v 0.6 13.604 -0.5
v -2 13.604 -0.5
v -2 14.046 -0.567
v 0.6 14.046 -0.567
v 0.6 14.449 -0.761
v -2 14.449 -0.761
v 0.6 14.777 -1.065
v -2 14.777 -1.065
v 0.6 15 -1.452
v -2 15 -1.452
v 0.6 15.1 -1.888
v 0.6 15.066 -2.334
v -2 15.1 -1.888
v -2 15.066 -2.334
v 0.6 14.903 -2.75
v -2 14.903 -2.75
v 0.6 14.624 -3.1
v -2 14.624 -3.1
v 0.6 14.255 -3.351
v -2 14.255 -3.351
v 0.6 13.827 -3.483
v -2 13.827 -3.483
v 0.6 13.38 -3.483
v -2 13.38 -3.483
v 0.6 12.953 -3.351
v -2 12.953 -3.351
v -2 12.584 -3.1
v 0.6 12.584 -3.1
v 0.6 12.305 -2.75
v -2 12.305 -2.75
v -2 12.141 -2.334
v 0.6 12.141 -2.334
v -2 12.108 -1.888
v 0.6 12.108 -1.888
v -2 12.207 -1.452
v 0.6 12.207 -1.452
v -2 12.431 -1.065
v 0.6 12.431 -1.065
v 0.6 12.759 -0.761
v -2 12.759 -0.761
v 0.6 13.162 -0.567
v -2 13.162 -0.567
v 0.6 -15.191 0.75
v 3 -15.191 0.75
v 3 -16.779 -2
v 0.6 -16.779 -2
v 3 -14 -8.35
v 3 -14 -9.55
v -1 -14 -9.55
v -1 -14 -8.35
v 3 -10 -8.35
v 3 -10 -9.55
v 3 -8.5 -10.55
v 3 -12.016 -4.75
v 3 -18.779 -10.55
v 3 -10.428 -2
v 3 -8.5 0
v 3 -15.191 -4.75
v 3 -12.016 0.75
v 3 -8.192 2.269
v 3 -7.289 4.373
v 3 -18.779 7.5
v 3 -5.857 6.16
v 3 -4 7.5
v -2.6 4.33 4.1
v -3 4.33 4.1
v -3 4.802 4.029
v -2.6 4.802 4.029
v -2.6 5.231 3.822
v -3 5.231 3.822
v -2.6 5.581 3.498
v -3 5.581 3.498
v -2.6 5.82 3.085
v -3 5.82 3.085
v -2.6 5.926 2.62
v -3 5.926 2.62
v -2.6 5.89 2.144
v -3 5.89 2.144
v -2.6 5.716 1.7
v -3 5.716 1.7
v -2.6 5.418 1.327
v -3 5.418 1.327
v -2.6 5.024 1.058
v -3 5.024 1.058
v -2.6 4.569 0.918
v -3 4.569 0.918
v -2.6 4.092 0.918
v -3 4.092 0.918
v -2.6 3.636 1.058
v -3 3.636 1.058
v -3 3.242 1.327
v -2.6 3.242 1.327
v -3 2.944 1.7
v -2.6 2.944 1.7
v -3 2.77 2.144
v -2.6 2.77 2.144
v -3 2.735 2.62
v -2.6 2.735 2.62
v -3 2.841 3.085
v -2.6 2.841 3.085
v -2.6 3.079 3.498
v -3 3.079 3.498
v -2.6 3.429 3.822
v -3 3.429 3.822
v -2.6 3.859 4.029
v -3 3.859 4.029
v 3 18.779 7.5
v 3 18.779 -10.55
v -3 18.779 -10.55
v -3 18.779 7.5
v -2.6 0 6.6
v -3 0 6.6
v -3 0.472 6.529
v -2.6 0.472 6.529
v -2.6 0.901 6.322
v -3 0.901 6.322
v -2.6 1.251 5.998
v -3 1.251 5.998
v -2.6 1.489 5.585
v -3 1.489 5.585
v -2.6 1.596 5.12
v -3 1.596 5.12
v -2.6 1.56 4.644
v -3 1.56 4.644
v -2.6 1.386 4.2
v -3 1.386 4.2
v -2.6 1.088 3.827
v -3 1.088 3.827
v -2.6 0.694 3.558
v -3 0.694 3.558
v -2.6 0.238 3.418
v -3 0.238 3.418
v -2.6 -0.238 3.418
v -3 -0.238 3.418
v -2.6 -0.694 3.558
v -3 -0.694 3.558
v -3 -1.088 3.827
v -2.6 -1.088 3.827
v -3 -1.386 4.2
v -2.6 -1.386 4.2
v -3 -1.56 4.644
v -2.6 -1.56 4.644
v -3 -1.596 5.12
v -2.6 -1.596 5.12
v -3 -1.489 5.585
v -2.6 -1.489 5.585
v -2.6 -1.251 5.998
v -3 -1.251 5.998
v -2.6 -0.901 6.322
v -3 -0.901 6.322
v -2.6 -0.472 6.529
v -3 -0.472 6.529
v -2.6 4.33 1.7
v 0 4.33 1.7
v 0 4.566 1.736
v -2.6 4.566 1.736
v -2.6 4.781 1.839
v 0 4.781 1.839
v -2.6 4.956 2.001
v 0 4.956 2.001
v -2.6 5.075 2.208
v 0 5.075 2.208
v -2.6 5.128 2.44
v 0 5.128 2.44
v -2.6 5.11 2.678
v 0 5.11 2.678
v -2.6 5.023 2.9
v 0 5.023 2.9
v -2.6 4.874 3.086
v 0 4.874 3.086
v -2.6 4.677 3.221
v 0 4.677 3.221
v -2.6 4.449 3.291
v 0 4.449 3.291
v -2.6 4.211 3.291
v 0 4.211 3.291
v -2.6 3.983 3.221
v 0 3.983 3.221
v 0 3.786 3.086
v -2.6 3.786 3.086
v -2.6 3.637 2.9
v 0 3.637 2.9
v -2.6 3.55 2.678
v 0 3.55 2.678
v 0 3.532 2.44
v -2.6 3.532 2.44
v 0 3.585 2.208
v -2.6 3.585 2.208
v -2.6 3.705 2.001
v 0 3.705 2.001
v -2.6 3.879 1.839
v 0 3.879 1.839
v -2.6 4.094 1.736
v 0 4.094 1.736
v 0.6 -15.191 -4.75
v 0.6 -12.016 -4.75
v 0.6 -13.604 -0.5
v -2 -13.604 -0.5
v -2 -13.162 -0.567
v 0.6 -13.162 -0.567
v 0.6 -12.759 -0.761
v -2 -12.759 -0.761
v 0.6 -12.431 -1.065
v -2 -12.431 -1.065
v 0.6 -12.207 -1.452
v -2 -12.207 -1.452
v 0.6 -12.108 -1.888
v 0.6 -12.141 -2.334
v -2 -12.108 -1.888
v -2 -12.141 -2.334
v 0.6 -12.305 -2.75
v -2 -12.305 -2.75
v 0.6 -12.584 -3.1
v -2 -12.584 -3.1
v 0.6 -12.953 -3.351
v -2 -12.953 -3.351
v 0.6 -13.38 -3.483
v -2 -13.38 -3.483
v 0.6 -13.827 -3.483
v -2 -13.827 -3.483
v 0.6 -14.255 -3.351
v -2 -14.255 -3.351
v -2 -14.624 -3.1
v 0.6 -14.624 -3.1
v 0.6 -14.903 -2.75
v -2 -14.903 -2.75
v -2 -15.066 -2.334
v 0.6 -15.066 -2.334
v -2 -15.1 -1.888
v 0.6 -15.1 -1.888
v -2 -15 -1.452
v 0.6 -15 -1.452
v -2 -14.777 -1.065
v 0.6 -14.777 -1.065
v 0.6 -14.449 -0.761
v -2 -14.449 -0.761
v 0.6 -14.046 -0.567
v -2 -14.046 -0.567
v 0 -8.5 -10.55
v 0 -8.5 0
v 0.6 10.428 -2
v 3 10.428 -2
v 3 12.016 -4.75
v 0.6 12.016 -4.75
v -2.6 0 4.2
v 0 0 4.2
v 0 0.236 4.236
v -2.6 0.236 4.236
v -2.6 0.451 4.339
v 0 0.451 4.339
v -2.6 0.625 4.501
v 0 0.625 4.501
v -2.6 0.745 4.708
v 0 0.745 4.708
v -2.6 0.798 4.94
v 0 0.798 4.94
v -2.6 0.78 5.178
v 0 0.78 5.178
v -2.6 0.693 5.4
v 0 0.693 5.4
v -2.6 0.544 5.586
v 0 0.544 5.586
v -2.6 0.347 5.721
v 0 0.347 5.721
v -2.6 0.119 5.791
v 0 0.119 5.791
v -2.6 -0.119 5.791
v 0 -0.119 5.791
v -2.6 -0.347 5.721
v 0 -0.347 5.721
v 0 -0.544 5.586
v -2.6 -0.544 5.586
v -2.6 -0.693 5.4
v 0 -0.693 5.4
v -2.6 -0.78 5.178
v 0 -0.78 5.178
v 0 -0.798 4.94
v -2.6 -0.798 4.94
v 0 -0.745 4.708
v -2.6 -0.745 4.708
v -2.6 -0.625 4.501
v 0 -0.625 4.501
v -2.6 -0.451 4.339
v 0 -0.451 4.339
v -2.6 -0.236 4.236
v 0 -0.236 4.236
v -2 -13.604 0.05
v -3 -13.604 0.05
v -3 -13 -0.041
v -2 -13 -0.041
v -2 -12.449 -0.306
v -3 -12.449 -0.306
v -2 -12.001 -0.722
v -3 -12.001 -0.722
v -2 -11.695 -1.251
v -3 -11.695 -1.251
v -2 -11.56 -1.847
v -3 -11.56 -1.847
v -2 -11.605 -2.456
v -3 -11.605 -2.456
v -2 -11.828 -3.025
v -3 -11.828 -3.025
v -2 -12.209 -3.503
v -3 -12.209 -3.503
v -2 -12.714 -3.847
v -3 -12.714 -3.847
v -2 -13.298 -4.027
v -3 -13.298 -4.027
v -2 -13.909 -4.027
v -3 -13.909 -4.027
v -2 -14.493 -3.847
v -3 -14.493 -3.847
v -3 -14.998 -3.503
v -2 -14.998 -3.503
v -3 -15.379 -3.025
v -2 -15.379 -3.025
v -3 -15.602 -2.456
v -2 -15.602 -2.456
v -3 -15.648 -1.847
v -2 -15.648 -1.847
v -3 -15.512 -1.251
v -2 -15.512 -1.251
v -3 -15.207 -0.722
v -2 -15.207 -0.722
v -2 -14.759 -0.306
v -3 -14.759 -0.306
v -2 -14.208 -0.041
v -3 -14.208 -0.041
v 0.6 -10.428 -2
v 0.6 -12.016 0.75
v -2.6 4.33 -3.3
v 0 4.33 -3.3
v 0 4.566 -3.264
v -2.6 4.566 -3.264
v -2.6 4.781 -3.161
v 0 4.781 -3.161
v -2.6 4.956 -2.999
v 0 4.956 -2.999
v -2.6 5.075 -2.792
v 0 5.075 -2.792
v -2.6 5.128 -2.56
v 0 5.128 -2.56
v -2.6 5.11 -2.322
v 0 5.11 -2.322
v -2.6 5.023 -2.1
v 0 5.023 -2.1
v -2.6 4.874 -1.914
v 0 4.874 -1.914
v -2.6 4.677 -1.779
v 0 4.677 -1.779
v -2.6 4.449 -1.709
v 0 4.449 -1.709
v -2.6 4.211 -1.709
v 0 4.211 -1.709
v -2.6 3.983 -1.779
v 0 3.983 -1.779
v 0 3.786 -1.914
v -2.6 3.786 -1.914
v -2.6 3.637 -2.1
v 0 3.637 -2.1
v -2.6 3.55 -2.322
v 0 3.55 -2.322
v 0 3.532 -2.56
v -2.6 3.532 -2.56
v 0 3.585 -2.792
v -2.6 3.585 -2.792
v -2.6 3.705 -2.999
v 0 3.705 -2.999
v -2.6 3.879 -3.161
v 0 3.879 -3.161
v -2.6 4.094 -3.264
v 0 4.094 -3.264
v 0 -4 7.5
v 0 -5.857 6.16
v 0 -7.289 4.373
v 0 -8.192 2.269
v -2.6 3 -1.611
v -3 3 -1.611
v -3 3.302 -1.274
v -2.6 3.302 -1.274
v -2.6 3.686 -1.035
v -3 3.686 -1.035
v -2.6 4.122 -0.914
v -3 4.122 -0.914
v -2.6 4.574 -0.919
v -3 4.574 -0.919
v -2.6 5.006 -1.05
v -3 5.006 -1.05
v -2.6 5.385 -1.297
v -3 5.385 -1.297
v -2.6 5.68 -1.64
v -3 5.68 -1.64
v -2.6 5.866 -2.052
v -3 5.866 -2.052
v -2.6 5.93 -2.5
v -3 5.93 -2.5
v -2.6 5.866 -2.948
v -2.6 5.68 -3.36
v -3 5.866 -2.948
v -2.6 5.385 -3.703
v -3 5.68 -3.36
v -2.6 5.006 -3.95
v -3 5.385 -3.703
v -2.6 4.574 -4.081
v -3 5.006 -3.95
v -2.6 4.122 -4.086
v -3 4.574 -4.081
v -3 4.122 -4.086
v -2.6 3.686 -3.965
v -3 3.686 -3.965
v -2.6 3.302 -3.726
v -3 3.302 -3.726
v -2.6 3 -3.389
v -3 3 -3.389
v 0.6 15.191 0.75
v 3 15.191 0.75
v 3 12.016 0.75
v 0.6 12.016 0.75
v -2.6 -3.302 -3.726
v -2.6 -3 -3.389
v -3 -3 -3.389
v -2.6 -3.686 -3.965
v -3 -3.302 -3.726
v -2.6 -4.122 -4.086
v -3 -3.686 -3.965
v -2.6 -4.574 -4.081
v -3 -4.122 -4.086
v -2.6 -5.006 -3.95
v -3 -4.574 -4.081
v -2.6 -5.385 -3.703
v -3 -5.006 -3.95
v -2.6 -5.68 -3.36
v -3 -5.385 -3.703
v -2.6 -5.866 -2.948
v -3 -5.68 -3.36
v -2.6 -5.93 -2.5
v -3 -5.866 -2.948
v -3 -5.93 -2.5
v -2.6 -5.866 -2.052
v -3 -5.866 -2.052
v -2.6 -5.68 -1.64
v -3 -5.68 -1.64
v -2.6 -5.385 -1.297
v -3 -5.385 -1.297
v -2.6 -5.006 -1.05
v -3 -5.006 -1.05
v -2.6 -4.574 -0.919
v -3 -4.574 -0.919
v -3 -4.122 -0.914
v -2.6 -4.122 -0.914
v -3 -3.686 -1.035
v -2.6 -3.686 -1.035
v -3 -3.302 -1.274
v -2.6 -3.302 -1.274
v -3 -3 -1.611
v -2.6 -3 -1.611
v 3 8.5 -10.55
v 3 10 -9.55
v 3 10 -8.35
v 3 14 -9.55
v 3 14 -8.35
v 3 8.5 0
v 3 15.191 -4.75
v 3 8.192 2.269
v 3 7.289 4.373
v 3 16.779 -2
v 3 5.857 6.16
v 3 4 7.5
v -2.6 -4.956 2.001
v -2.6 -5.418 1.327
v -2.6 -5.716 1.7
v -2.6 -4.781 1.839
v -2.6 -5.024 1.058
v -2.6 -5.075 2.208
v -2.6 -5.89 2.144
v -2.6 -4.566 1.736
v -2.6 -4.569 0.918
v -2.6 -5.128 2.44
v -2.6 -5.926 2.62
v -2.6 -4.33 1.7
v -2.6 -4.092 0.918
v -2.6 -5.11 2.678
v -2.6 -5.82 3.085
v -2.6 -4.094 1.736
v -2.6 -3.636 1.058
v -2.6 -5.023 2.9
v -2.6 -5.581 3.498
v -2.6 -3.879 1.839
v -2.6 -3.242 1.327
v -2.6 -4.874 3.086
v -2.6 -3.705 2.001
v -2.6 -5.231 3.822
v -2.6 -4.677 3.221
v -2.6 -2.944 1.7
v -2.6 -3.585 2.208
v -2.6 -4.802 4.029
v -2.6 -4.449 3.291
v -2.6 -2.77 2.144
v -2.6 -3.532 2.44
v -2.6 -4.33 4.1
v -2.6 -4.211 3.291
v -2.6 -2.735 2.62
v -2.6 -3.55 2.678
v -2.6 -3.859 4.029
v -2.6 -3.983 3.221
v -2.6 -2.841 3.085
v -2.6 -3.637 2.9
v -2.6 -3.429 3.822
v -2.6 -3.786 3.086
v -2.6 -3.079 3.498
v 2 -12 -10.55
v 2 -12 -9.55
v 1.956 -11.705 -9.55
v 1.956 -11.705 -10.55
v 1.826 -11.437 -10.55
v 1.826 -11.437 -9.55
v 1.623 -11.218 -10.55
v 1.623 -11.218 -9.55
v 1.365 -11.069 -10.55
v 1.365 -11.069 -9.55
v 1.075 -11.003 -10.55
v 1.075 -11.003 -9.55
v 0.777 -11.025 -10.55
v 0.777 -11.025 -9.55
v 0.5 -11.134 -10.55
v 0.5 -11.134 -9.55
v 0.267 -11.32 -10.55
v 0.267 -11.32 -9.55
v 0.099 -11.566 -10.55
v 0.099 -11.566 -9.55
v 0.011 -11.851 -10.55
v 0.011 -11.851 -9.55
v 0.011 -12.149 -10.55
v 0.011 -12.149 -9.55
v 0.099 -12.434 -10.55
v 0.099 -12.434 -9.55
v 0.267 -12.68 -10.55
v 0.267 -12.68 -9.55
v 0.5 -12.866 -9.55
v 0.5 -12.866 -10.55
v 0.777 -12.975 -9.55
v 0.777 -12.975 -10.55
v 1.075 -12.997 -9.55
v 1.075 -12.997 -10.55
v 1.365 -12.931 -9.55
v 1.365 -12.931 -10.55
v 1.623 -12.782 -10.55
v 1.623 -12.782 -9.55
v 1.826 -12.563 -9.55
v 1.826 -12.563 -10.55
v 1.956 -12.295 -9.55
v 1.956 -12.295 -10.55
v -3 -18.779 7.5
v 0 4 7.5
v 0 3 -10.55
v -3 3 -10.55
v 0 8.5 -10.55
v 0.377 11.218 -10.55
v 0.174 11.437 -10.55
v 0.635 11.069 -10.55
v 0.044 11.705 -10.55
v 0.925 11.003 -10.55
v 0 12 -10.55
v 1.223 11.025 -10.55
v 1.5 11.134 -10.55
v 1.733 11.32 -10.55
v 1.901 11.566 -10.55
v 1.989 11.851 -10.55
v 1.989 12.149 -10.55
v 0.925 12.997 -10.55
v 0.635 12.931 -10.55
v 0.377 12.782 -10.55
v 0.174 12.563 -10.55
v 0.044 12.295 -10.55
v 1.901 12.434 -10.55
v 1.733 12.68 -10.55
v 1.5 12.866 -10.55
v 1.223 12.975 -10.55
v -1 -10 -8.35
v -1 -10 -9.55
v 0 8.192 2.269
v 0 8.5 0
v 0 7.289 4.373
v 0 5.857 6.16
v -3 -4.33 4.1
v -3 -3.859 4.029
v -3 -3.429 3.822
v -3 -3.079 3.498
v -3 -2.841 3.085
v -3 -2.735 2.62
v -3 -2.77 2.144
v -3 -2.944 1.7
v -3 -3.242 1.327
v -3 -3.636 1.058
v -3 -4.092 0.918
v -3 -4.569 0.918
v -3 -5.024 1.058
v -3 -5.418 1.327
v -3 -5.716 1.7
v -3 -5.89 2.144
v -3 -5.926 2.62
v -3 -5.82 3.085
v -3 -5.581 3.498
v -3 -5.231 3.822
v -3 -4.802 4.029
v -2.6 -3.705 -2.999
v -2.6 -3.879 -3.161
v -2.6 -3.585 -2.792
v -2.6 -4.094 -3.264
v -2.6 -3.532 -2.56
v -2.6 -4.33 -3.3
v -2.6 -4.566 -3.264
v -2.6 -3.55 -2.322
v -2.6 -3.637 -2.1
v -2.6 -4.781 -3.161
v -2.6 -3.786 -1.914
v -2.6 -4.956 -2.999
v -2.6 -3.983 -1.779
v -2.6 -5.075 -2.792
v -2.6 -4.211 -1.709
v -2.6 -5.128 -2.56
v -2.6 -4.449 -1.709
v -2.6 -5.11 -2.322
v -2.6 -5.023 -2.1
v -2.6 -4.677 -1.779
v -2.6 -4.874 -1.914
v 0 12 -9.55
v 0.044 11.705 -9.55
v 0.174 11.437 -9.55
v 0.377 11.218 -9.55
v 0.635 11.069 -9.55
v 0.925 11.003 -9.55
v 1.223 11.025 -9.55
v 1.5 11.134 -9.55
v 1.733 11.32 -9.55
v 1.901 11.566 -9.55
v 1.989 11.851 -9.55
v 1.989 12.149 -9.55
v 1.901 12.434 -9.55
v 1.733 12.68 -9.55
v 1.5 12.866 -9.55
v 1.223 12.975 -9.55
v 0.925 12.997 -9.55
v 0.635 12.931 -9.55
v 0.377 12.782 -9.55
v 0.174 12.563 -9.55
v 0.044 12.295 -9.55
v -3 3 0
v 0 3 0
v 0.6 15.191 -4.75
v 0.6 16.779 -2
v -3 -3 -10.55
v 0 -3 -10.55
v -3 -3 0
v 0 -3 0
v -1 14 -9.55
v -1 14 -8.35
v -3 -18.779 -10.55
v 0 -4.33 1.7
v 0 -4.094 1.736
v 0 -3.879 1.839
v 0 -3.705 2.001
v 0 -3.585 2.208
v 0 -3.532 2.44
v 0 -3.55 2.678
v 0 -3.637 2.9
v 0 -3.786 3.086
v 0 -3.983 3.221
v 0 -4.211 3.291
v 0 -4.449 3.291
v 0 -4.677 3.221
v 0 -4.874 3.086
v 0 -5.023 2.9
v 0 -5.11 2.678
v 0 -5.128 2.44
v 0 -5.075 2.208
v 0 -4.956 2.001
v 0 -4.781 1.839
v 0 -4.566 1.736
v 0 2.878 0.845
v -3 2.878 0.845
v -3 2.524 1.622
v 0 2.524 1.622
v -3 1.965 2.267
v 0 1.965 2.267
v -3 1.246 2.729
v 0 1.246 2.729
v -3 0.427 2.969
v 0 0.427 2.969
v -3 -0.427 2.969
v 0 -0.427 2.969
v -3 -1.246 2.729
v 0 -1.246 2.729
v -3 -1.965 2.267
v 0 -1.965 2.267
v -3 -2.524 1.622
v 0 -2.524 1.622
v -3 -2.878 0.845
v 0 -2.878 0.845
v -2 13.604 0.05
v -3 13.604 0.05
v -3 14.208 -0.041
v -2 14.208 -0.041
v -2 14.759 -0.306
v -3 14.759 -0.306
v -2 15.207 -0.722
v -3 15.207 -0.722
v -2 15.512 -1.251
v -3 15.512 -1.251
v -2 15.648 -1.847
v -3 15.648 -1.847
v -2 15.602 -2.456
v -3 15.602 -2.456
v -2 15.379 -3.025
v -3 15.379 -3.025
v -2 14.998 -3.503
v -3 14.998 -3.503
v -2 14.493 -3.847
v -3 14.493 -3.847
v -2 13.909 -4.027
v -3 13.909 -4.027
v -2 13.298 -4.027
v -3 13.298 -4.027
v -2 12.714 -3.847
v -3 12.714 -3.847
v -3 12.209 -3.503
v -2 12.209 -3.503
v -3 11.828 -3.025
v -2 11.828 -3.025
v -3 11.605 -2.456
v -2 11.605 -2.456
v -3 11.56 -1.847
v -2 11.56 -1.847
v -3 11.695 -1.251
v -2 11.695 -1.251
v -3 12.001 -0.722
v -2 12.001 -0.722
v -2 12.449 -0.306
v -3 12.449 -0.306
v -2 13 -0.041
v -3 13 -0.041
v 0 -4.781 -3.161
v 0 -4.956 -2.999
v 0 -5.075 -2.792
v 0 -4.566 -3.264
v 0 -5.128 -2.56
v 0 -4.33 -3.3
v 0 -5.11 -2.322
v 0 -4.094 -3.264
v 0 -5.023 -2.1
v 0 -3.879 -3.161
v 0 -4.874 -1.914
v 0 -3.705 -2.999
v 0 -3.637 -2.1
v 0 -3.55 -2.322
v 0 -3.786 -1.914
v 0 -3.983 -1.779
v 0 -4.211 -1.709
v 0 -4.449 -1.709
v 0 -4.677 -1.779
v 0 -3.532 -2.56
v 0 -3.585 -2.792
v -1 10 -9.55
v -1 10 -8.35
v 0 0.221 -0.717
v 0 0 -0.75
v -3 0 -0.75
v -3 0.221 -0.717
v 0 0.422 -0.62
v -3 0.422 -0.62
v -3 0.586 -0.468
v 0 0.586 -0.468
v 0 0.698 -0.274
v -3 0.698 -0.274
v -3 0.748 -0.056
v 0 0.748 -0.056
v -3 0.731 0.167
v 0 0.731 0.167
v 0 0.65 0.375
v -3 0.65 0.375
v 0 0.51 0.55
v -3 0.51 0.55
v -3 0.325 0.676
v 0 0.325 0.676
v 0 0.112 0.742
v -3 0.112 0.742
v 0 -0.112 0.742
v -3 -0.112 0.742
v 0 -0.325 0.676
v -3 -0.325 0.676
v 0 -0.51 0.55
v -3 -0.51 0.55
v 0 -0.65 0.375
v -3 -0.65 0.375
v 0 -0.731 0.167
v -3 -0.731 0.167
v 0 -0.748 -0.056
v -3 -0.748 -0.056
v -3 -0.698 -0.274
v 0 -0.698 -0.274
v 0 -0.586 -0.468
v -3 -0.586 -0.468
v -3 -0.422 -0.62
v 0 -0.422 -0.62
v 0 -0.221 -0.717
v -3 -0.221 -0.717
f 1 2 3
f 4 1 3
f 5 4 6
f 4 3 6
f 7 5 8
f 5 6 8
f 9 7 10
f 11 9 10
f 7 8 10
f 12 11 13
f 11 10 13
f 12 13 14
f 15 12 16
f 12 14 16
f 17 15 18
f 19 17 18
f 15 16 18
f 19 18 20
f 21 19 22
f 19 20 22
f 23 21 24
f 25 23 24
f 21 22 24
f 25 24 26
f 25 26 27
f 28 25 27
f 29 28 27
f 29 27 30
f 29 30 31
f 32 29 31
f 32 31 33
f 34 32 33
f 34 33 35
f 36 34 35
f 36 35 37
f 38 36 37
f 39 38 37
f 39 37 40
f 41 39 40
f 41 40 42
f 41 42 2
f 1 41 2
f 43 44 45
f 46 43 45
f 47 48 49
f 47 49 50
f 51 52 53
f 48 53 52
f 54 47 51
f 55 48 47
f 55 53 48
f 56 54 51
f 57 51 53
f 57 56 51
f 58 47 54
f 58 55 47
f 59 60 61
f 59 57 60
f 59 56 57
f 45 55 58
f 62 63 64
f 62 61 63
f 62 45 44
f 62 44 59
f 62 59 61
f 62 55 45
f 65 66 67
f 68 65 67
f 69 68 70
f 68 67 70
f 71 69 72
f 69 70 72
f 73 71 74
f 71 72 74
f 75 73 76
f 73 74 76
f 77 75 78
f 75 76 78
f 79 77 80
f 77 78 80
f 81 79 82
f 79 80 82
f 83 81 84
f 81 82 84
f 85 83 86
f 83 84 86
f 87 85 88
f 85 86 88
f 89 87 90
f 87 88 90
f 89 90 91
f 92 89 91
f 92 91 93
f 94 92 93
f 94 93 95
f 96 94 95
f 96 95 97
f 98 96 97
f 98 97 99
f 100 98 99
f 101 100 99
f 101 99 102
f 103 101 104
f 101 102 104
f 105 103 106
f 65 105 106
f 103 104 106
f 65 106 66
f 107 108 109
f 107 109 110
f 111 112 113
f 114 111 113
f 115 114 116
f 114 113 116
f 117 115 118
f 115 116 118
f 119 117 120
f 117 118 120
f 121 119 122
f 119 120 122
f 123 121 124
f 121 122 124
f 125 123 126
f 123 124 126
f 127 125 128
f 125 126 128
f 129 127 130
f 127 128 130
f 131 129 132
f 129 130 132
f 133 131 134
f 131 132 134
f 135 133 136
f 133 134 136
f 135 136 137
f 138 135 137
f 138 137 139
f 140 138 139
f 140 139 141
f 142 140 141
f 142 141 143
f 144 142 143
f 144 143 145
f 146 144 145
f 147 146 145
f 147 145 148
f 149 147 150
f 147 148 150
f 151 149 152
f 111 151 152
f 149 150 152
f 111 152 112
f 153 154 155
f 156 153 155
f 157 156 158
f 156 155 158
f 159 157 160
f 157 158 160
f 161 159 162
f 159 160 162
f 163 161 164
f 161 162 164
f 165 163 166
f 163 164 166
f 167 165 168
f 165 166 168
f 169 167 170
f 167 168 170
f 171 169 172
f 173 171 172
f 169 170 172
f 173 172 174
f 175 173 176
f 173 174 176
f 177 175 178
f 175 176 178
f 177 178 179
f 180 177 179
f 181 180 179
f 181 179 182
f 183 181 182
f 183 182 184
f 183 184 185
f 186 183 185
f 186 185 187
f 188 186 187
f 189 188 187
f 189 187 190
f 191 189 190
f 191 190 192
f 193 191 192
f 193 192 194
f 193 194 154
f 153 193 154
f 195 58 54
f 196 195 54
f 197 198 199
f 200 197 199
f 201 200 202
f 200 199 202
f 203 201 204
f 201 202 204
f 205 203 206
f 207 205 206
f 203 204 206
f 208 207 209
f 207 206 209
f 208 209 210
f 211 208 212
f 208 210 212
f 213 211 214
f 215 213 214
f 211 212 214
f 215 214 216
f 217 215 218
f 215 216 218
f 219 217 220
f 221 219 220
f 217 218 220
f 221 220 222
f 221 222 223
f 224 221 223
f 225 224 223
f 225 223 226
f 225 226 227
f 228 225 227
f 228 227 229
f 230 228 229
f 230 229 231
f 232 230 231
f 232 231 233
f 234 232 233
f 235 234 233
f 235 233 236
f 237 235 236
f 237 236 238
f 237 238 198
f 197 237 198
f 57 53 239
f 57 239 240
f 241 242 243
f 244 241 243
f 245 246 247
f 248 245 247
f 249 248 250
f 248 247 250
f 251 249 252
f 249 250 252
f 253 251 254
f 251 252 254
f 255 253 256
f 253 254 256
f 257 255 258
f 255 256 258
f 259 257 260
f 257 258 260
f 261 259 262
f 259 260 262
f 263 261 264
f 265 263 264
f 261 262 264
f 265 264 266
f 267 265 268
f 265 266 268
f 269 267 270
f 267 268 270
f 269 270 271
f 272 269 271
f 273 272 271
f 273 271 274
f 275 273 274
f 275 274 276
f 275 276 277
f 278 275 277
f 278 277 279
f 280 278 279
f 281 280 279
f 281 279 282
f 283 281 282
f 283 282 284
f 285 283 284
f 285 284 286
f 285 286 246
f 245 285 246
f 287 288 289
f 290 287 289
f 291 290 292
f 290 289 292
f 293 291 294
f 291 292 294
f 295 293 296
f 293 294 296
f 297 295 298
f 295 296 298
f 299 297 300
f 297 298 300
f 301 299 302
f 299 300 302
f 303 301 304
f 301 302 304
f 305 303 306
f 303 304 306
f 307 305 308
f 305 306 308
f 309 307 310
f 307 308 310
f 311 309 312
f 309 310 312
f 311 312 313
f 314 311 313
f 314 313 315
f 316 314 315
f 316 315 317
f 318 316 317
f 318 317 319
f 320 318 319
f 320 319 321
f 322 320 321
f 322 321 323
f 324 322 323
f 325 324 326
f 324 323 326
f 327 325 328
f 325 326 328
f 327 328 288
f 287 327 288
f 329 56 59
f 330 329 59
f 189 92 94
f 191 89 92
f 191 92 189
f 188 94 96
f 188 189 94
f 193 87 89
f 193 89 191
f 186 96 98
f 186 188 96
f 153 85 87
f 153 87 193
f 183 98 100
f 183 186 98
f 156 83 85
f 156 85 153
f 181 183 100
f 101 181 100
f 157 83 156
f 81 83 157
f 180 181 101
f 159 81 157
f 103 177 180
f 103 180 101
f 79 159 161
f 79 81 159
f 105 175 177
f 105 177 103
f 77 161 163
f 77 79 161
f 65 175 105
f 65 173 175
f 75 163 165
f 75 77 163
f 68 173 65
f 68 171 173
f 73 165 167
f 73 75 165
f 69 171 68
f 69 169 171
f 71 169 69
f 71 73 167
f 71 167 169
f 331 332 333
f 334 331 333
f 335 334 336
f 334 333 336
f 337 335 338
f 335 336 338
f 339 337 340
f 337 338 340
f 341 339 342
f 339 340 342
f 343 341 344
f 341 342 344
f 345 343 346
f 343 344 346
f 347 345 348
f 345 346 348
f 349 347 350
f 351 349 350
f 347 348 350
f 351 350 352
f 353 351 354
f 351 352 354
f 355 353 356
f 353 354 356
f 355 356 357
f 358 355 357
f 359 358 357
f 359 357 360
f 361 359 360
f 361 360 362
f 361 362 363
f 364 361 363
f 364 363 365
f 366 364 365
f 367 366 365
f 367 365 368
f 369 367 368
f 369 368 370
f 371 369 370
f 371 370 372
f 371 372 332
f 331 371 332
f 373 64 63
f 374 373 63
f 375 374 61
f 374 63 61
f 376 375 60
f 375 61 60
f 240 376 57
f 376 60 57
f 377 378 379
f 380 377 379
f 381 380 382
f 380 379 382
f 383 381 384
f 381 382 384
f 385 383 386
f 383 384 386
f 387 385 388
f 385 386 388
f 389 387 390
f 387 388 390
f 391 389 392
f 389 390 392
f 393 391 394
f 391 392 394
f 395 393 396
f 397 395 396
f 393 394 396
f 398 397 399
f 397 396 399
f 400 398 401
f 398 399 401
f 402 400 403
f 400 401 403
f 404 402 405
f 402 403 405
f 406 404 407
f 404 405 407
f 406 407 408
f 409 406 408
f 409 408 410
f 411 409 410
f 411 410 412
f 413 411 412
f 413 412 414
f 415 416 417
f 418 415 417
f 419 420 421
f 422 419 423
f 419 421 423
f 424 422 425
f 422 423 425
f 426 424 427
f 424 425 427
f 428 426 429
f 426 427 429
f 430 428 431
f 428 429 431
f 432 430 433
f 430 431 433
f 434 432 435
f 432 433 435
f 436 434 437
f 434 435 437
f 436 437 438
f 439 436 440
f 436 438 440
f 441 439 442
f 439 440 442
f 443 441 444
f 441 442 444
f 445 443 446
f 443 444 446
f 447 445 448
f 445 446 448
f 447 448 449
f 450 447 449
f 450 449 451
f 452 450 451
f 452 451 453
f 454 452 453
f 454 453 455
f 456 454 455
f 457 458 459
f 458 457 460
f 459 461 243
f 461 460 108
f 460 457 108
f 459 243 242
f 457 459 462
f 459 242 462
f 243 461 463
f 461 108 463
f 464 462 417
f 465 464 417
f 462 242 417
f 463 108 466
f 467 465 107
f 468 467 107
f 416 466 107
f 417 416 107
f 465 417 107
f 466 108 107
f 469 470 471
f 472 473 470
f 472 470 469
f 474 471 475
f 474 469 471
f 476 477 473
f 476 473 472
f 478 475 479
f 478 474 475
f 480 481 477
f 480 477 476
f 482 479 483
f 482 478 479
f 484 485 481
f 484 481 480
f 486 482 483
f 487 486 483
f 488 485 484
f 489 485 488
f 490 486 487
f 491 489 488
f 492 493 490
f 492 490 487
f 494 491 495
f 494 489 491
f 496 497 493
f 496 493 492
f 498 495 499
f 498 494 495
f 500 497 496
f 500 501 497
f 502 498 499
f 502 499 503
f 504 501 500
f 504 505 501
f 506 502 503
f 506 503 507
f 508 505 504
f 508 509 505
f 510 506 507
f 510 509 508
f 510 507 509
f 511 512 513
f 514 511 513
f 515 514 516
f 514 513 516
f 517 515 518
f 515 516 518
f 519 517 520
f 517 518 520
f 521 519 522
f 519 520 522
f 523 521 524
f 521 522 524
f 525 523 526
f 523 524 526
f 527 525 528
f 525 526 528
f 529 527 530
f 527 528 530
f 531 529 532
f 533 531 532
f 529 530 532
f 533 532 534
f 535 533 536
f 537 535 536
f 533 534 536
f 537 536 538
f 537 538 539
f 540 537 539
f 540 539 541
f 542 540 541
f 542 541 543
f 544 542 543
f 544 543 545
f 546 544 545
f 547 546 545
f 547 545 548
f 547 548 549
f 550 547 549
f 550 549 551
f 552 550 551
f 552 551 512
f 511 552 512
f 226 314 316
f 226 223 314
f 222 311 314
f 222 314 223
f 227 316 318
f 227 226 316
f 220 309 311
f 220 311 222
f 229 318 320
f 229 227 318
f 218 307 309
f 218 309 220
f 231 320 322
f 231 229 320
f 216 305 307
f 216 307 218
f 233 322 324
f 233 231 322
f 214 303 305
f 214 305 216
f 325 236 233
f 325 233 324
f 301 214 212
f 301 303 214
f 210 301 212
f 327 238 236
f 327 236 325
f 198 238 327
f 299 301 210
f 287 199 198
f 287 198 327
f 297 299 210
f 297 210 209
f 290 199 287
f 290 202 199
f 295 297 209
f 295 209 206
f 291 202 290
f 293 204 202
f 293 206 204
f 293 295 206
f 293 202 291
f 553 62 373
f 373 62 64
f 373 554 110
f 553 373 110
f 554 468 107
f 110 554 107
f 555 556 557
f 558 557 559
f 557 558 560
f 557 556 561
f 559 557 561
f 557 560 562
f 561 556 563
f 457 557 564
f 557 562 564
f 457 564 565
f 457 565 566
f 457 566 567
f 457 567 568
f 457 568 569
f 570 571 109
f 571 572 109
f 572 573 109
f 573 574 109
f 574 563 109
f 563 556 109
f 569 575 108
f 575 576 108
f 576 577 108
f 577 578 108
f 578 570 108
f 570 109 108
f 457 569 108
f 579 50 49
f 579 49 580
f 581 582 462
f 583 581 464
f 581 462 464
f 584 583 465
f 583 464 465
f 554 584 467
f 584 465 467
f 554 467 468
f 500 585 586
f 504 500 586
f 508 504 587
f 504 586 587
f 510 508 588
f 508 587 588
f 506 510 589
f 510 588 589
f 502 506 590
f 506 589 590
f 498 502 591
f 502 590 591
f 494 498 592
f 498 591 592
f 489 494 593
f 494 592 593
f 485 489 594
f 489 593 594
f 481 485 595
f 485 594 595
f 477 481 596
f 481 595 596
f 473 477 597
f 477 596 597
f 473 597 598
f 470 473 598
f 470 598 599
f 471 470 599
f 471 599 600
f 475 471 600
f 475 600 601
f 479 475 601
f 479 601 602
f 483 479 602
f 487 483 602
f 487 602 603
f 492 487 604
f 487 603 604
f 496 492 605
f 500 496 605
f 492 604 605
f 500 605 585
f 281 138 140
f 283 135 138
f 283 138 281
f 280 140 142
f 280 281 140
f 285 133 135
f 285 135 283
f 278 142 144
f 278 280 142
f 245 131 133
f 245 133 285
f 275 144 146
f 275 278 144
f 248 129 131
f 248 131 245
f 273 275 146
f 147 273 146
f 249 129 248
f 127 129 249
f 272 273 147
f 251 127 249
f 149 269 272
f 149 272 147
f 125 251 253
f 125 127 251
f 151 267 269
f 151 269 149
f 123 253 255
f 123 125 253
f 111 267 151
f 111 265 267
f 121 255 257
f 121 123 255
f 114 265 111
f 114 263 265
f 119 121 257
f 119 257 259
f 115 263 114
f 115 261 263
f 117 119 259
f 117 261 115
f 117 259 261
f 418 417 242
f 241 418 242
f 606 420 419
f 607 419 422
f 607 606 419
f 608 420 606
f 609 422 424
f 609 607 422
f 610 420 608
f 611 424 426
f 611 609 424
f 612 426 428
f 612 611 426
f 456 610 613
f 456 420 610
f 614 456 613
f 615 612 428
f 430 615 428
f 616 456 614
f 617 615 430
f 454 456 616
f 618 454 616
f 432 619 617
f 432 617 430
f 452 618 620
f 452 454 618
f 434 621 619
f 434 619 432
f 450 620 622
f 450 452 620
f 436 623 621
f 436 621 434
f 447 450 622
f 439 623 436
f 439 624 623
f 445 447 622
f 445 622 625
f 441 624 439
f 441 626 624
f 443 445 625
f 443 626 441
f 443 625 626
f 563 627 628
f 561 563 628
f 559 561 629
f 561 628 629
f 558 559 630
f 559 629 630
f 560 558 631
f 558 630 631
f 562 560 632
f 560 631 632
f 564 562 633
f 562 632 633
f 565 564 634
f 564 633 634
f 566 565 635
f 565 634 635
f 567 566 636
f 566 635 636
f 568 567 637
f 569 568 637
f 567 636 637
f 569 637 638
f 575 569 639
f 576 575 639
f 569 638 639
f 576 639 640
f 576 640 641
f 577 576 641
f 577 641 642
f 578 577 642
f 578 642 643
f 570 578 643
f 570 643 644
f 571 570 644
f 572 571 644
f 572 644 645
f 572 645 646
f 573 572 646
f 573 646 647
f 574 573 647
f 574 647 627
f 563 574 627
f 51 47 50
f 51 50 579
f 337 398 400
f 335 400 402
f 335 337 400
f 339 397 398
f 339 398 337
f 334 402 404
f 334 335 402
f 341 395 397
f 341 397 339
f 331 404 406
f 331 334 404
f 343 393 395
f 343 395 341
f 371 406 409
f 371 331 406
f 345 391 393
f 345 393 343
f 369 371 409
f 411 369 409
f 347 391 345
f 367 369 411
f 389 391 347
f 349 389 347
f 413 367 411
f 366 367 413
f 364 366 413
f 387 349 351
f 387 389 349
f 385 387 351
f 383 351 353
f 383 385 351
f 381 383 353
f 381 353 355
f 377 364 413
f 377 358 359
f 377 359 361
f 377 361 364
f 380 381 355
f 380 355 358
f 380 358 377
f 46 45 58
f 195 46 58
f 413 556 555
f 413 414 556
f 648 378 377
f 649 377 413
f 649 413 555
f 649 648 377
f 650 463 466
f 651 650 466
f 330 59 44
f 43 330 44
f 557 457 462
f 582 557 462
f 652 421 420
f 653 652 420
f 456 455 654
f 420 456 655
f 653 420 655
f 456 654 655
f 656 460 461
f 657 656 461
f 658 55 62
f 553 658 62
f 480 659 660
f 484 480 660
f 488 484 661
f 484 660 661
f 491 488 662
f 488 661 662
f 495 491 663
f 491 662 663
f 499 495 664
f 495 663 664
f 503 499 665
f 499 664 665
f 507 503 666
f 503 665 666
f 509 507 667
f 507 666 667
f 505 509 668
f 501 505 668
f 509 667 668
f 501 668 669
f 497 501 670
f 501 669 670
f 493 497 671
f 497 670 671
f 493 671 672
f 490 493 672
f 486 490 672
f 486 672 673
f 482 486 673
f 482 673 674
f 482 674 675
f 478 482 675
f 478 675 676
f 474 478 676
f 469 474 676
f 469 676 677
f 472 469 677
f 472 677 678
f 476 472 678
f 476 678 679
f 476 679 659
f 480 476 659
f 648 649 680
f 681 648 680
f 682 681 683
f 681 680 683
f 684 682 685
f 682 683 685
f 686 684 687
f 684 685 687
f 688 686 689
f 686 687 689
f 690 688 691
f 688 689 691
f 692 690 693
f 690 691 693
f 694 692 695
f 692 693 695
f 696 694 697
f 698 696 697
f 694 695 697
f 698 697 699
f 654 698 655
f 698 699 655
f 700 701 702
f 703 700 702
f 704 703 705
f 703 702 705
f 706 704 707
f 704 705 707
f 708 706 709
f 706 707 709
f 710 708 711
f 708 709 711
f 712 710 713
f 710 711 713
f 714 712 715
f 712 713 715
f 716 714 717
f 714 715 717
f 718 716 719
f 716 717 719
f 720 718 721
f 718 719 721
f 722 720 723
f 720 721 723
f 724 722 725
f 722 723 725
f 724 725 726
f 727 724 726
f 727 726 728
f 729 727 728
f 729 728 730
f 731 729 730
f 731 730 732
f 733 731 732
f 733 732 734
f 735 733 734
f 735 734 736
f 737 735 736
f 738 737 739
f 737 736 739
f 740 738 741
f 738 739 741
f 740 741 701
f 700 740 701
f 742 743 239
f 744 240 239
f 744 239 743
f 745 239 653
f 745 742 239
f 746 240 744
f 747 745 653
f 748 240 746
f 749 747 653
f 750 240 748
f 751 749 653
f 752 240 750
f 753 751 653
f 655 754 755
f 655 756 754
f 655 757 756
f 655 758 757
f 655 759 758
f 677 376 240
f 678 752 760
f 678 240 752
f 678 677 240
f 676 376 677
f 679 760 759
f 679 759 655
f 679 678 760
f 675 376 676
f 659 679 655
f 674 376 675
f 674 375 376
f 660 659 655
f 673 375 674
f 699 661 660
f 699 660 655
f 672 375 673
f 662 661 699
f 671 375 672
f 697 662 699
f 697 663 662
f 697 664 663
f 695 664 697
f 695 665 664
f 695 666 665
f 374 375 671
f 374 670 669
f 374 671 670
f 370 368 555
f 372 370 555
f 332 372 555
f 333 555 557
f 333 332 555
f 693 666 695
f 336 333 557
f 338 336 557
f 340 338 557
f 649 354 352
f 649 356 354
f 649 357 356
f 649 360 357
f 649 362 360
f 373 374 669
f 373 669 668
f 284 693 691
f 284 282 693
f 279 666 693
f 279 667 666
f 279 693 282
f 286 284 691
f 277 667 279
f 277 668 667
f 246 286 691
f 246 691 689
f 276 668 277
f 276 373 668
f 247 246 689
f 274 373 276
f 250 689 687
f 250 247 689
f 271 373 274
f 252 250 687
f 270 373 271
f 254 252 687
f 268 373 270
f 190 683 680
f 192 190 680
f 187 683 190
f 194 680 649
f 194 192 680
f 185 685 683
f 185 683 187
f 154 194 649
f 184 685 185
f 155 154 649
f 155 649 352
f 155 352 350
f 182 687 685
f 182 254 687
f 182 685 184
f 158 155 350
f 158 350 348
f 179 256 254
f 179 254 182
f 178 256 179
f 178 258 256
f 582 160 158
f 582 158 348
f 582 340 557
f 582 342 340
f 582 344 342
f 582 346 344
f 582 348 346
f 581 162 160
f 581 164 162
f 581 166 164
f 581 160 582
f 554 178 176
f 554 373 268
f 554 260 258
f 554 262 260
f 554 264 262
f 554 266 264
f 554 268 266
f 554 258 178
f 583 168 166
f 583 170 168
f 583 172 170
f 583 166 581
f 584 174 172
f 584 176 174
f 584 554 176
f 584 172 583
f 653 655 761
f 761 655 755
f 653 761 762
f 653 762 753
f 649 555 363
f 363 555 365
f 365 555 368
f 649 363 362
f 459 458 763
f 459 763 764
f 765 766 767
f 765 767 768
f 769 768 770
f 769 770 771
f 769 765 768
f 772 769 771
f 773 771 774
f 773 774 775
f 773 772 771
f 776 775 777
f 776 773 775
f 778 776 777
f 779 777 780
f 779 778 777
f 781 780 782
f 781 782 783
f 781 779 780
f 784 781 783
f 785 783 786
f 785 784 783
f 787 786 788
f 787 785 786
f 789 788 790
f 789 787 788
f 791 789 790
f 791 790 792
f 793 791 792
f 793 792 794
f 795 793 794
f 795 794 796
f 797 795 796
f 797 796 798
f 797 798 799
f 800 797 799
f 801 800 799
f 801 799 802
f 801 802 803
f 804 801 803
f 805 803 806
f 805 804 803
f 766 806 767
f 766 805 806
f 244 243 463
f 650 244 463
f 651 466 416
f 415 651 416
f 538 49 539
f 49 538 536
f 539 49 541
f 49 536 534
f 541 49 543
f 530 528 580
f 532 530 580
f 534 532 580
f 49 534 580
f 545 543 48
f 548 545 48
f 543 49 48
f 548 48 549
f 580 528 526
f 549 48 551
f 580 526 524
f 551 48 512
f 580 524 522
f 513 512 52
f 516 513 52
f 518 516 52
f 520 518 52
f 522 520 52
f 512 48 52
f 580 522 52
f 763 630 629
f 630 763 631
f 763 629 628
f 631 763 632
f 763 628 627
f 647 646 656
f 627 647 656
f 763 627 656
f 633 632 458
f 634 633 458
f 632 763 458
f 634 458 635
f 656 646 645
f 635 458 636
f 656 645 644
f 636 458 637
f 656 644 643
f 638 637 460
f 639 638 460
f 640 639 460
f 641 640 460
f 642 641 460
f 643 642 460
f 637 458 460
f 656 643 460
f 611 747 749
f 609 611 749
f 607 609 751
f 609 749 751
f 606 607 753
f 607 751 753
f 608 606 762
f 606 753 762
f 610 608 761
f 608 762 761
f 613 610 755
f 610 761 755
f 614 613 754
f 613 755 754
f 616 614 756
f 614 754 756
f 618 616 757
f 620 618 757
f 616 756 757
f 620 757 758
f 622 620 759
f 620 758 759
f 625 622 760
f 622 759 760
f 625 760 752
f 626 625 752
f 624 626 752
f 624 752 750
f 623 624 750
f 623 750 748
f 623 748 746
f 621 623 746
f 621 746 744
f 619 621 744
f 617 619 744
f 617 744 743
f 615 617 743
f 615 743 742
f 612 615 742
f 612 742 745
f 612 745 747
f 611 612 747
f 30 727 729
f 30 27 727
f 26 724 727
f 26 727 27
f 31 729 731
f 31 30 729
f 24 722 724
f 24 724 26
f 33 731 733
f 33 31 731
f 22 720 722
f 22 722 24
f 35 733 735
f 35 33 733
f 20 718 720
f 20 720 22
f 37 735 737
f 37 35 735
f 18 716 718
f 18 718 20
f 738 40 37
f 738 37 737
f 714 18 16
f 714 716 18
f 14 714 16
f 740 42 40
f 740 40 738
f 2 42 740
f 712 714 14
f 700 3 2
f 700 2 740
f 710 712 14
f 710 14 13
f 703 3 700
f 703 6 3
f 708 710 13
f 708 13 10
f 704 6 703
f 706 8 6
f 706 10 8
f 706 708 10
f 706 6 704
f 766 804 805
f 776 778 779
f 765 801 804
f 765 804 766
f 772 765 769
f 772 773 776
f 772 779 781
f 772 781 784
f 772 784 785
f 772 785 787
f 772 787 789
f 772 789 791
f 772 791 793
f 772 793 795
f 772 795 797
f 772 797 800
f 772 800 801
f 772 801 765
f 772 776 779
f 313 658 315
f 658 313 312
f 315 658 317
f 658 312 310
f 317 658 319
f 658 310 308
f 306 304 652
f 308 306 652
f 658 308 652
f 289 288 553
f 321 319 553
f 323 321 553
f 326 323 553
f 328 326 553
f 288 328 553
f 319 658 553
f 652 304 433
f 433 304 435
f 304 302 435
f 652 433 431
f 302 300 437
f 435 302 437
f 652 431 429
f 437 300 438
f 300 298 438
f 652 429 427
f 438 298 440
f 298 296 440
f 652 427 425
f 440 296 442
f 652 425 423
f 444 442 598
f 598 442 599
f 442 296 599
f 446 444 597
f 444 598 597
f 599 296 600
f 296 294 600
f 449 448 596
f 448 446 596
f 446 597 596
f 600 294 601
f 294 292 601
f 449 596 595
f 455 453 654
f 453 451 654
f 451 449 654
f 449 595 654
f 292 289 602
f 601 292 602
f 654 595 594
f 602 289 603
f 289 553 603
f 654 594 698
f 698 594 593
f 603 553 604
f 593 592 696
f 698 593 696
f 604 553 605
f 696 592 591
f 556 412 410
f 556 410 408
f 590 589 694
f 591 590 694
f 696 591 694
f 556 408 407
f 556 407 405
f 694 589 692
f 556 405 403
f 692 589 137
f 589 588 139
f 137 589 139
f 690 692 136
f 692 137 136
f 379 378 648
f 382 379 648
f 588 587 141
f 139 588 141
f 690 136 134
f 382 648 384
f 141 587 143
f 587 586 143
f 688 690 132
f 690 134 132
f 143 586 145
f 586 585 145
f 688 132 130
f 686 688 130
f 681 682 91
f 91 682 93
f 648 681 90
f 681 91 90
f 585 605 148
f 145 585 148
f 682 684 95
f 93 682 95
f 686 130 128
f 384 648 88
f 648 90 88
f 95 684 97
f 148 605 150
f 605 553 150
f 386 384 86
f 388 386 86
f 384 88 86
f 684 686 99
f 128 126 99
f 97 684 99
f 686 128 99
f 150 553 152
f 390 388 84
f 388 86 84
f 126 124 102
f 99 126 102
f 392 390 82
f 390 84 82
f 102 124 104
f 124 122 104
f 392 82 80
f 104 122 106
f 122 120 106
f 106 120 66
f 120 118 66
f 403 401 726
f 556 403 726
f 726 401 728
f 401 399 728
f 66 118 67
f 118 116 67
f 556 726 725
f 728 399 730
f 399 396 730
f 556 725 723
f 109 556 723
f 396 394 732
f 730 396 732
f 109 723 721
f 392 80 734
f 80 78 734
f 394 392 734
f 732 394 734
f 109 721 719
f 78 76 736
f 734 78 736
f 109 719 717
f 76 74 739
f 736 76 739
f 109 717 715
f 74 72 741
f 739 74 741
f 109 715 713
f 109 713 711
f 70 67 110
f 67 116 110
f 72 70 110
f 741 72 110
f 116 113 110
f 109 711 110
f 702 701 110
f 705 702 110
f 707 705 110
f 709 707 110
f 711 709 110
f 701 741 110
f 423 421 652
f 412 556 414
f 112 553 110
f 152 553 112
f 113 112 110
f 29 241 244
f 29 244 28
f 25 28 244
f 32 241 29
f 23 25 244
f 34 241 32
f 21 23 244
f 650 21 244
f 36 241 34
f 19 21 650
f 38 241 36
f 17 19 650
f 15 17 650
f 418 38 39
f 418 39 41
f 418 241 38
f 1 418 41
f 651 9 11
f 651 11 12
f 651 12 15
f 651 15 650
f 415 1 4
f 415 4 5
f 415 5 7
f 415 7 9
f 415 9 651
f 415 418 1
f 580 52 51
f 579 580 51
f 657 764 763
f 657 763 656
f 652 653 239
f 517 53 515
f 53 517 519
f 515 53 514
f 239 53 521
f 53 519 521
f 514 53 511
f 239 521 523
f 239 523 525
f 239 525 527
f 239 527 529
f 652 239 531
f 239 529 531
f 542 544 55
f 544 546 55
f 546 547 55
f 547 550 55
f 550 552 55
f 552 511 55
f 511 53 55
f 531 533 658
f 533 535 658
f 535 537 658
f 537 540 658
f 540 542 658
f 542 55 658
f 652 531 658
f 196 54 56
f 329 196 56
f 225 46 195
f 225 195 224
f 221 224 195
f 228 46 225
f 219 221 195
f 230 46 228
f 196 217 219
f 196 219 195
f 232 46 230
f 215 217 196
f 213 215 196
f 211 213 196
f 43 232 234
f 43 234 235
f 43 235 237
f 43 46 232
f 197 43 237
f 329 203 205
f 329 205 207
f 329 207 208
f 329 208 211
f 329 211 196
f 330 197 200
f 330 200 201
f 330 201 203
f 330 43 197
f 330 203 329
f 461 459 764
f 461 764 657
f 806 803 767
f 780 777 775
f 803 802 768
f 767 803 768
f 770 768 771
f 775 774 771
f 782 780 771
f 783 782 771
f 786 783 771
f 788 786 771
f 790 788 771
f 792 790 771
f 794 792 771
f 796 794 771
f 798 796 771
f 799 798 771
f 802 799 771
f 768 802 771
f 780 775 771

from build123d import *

# Parameters (mm, degrees)
SKETCH_2_W           = 40
SKETCH_2_H           = 15
EXTRUDE_5_DEPTH      = 3
SKETCH_10_R          = 0.8
CUT_EXTRUDE_2_DEPTH  = 23.186707732
CUT_EXTRUDE_3_DEPTH  = 23.186707732
SKETCH_12_R          = 8.5
CUT_EXTRUDE_4_DEPTH  = 3
SKETCH_13_R          = 1.6
CUT_EXTRUDE_5_DEPTH  = 0.4
SKETCH_15_R          = 0.75
EXTRUDE_6_DEPTH      = 3
SKETCH_16_R          = 1.5
CUT_EXTRUDE_6_DEPTH  = 23.186707732
SKETCH_18_R          = 2.05
CUT_EXTRUDE_8_DEPTH  = 1
CUT_EXTRUDE_10_DEPTH = 2.4
EXTRUDE_7_DEPTH      = 3.05
SKETCH_24_W          = 3
SKETCH_24_H          = 3.05
EXTRUDE_8_DEPTH      = 1.08
SKETCH_25_W          = 3
SKETCH_25_H          = 3.05
EXTRUDE_9_DEPTH      = 1
SKETCH_26_R          = 8.5
SKETCH_26_W          = 17
SKETCH_26_H          = 10.55
CUT_EXTRUDE_11_DEPTH = 3
SKETCH_28_W          = 1.220805659
SKETCH_28_H          = 18.05
CUT_EXTRUDE_12_DEPTH = 24.394497216
SKETCH_29_W          = 4
SKETCH_29_H          = 1.2
CUT_EXTRUDE_13_DEPTH = 4
SKETCH_30_R          = 1
CUT_EXTRUDE_14_DEPTH = 26.541351571


with BuildPart() as part:
    # ｽｹｯﾁ2 → ﾎﾞｽ - 押し出し5 (new, symmetric)
    with BuildSketch(Plane.YZ):
        Rectangle(SKETCH_2_W, SKETCH_2_H)
    extrude(amount=EXTRUDE_5_DEPTH, both=True)

    # ｽｹｯﾁ10 → ｶｯﾄ - 押し出し2 (cut, through all)
    with BuildSketch(Plane.YZ.offset(3)):
        with Locations(Location((-4.330127019, 2.5, 0), (0, 0, 270))):
            Circle(SKETCH_10_R)
        with Locations(Location((4.330127019, -2.5, 0), (0, 0, 270))):
            Circle(SKETCH_10_R)
        with Locations(Location((0, 5, 0), (0, 0, 270))):
            Circle(SKETCH_10_R)
        with Locations(Location((4.330127019, 2.5, 0), (0, 0, 270))):
            Circle(SKETCH_10_R)
        with Locations(Location((-4.330127019, -2.5, 0), (0, 0, 270))):
            Circle(SKETCH_10_R)
    extrude(amount=-CUT_EXTRUDE_2_DEPTH, mode=Mode.SUBTRACT)

    # ｽｹｯﾁ11 → ｶｯﾄ - 押し出し3 (cut, through all)
    with BuildSketch(Plane.YZ.offset(3)):
        with BuildLine():
            ThreePointArc((3, 0), (0, -3), (-3, 0))
            Line((-3, 0), (-3, -7.5))
            Line((-3, -7.5), (3, -7.5))
            Line((3, -7.5), (3, 0))
        make_face()
        with BuildLine():
            ThreePointArc((3, 0), (0, 3), (-3, 0))
            Line((-3, 0), (3, 0))
        make_face()
        with BuildLine():
            Line((3, 0), (-3, 0))
            ThreePointArc((-3, 0), (0, -3), (3, 0))
        make_face()
    extrude(amount=-CUT_EXTRUDE_3_DEPTH, mode=Mode.SUBTRACT)

    # ｽｹｯﾁ12 → ｶｯﾄ - 押し出し4 (cut)
    with BuildSketch(Plane.YZ.offset(3)):
        Circle(SKETCH_12_R)
    extrude(amount=-CUT_EXTRUDE_4_DEPTH, mode=Mode.SUBTRACT)

    # ｽｹｯﾁ13 → ｶｯﾄ - 押し出し5 (cut)
    with BuildSketch(Plane(origin=(-3, 0, 0), x_dir=(0, -1, 0), z_dir=(-1, 0, 0))):
        with Locations((-4.330127019, -2.5)):
            Circle(SKETCH_13_R)
        with Locations(Location((-4.330127019, 2.5, 0), (0, 0, 90))):
            Circle(SKETCH_13_R)
        with Locations(Location((0, 5, 0), (0, 0, 90))):
            Circle(SKETCH_13_R)
        with Locations(Location((4.330127019, 2.5, 0), (0, 0, 90))):
            Circle(SKETCH_13_R)
        with Locations((4.330127019, -2.5)):
            Circle(SKETCH_13_R)
    extrude(amount=-CUT_EXTRUDE_5_DEPTH, mode=Mode.SUBTRACT)

    # ｽｹｯﾁ16 → ｶｯﾄ - 押し出し6 (cut, through all)
    with BuildSketch(Plane(origin=(-3, 0, 0), x_dir=(0, -1, 0), z_dir=(-1, 0, 0))):
        with Locations(Location((-13.60376786, -2, 0), (0, 0, 90))):
            Circle(SKETCH_16_R)
        with Locations(Location((13.60376786, -2, 0), (0, 0, 90))):
            Circle(SKETCH_16_R)
    extrude(amount=-CUT_EXTRUDE_6_DEPTH, mode=Mode.SUBTRACT)

    # ｽｹｯﾁ18 → ｶｯﾄ - 押し出し8 (cut)
    with BuildSketch(Plane(origin=(-3, 0, 0), x_dir=(0, -1, 0), z_dir=(-1, 0, 0))):
        with Locations(Location((-13.60376786, -2, 0), (0, 0, 90))):
            Circle(SKETCH_18_R)
        with Locations(Location((13.60376786, -2, 0), (0, 0, 90))):
            Circle(SKETCH_18_R)
    extrude(amount=-CUT_EXTRUDE_8_DEPTH, mode=Mode.SUBTRACT)

    # ｽｹｯﾁ19 → ｶｯﾄ - 押し出し10 (cut)
    with BuildSketch(Plane.YZ.offset(3)):
        Polygon((15.191481101, -4.75), (16.779194341, -2), (15.191481101, 0.75), (12.01605462, 0.75), (10.42834138, -2), (12.01605462, -4.75), align=None)
        Polygon((-10.42834138, -2), (-12.01605462, 0.75), (-15.191481101, 0.75), (-16.779194341, -2), (-15.191481101, -4.75), (-12.01605462, -4.75), align=None)
    extrude(amount=-CUT_EXTRUDE_10_DEPTH, mode=Mode.SUBTRACT)

    # ｽｹｯﾁ23 → ﾎﾞｽ - 押し出し7 (add)
    with BuildSketch(Plane(origin=(0, 0, -7.5), x_dir=(1, 0, 0), z_dir=(0, 0, -1))):
        Polygon((-3, 4.077623582), (-3, 3), (0, 3), (0, 4.077623582), (3, 4.077623582), (3, 20), (-3, 20), align=None)
        Polygon((-3, -3), (0, -3), (0, -4), (3, -4), (3, -20), (-3, -20), (-3, -4), align=None)
    extrude(amount=EXTRUDE_7_DEPTH)

    # ｽｹｯﾁ24 → ﾎﾞｽ - 押し出し8 (add)
    with BuildSketch(Plane(origin=(0, -4.077623582, 0), x_dir=(-1, 0, 0), z_dir=(0, 1, 0))):
        with Locations((-1.5, -9.025)):
            Rectangle(SKETCH_24_W, SKETCH_24_H)
    extrude(amount=EXTRUDE_8_DEPTH)

    # ｽｹｯﾁ25 → ﾎﾞｽ - 押し出し9 (add)
    with BuildSketch(Plane.XZ.offset(-4)):
        with Locations((1.5, -9.025)):
            Rectangle(SKETCH_25_W, SKETCH_25_H)
    extrude(amount=EXTRUDE_9_DEPTH)

    # ｽｹｯﾁ26 → ｶｯﾄ - 押し出し11 (cut)
    with BuildSketch(Plane.YZ.offset(3)):
        Circle(SKETCH_26_R)
        with Locations((0, -5.275)):
            Rectangle(SKETCH_26_W, SKETCH_26_H)
    extrude(amount=-CUT_EXTRUDE_11_DEPTH, mode=Mode.SUBTRACT)

    # ｽｹｯﾁ28 → ｶｯﾄ - 押し出し12 (cut, through all)
    with BuildSketch(Plane.YZ.offset(3)):
        with Locations((-19.389597171, -1.525)):
            Rectangle(SKETCH_28_W, SKETCH_28_H)
        with Locations((19.389597171, -1.525)):
            Rectangle(SKETCH_28_W, SKETCH_28_H)
    extrude(amount=-CUT_EXTRUDE_12_DEPTH, mode=Mode.SUBTRACT)

    # ｽｹｯﾁ29 → ｶｯﾄ - 押し出し13 (cut)
    with BuildSketch(Plane.YZ.offset(3)):
        with Locations((-12, -8.95)):
            Rectangle(SKETCH_29_W, SKETCH_29_H)
        with Locations((12, -8.95)):
            Rectangle(SKETCH_29_W, SKETCH_29_H)
    extrude(amount=-CUT_EXTRUDE_13_DEPTH, mode=Mode.SUBTRACT)

    # ｽｹｯﾁ30 → ｶｯﾄ - 押し出し14 (cut, through all)
    with BuildSketch(Plane.XY.offset(-9.55)):
        with Locations((1, -12)):
            Circle(SKETCH_30_R)
        with Locations(Location((1, 12, 0), (0, 0, 180))):
            Circle(SKETCH_30_R)
    extrude(amount=-CUT_EXTRUDE_14_DEPTH, mode=Mode.SUBTRACT)


with BuildPart() as body_2:
    # ｽｹｯﾁ15 → ﾎﾞｽ - 押し出し6 (new body)
    with BuildSketch(Plane.YZ):
        with Locations(Location((0, 0, 0), (0, 0, 270))):
            Circle(SKETCH_15_R)
    extrude(amount=-EXTRUDE_6_DEPTH)


solid = Compound([part.part, body_2.part])
